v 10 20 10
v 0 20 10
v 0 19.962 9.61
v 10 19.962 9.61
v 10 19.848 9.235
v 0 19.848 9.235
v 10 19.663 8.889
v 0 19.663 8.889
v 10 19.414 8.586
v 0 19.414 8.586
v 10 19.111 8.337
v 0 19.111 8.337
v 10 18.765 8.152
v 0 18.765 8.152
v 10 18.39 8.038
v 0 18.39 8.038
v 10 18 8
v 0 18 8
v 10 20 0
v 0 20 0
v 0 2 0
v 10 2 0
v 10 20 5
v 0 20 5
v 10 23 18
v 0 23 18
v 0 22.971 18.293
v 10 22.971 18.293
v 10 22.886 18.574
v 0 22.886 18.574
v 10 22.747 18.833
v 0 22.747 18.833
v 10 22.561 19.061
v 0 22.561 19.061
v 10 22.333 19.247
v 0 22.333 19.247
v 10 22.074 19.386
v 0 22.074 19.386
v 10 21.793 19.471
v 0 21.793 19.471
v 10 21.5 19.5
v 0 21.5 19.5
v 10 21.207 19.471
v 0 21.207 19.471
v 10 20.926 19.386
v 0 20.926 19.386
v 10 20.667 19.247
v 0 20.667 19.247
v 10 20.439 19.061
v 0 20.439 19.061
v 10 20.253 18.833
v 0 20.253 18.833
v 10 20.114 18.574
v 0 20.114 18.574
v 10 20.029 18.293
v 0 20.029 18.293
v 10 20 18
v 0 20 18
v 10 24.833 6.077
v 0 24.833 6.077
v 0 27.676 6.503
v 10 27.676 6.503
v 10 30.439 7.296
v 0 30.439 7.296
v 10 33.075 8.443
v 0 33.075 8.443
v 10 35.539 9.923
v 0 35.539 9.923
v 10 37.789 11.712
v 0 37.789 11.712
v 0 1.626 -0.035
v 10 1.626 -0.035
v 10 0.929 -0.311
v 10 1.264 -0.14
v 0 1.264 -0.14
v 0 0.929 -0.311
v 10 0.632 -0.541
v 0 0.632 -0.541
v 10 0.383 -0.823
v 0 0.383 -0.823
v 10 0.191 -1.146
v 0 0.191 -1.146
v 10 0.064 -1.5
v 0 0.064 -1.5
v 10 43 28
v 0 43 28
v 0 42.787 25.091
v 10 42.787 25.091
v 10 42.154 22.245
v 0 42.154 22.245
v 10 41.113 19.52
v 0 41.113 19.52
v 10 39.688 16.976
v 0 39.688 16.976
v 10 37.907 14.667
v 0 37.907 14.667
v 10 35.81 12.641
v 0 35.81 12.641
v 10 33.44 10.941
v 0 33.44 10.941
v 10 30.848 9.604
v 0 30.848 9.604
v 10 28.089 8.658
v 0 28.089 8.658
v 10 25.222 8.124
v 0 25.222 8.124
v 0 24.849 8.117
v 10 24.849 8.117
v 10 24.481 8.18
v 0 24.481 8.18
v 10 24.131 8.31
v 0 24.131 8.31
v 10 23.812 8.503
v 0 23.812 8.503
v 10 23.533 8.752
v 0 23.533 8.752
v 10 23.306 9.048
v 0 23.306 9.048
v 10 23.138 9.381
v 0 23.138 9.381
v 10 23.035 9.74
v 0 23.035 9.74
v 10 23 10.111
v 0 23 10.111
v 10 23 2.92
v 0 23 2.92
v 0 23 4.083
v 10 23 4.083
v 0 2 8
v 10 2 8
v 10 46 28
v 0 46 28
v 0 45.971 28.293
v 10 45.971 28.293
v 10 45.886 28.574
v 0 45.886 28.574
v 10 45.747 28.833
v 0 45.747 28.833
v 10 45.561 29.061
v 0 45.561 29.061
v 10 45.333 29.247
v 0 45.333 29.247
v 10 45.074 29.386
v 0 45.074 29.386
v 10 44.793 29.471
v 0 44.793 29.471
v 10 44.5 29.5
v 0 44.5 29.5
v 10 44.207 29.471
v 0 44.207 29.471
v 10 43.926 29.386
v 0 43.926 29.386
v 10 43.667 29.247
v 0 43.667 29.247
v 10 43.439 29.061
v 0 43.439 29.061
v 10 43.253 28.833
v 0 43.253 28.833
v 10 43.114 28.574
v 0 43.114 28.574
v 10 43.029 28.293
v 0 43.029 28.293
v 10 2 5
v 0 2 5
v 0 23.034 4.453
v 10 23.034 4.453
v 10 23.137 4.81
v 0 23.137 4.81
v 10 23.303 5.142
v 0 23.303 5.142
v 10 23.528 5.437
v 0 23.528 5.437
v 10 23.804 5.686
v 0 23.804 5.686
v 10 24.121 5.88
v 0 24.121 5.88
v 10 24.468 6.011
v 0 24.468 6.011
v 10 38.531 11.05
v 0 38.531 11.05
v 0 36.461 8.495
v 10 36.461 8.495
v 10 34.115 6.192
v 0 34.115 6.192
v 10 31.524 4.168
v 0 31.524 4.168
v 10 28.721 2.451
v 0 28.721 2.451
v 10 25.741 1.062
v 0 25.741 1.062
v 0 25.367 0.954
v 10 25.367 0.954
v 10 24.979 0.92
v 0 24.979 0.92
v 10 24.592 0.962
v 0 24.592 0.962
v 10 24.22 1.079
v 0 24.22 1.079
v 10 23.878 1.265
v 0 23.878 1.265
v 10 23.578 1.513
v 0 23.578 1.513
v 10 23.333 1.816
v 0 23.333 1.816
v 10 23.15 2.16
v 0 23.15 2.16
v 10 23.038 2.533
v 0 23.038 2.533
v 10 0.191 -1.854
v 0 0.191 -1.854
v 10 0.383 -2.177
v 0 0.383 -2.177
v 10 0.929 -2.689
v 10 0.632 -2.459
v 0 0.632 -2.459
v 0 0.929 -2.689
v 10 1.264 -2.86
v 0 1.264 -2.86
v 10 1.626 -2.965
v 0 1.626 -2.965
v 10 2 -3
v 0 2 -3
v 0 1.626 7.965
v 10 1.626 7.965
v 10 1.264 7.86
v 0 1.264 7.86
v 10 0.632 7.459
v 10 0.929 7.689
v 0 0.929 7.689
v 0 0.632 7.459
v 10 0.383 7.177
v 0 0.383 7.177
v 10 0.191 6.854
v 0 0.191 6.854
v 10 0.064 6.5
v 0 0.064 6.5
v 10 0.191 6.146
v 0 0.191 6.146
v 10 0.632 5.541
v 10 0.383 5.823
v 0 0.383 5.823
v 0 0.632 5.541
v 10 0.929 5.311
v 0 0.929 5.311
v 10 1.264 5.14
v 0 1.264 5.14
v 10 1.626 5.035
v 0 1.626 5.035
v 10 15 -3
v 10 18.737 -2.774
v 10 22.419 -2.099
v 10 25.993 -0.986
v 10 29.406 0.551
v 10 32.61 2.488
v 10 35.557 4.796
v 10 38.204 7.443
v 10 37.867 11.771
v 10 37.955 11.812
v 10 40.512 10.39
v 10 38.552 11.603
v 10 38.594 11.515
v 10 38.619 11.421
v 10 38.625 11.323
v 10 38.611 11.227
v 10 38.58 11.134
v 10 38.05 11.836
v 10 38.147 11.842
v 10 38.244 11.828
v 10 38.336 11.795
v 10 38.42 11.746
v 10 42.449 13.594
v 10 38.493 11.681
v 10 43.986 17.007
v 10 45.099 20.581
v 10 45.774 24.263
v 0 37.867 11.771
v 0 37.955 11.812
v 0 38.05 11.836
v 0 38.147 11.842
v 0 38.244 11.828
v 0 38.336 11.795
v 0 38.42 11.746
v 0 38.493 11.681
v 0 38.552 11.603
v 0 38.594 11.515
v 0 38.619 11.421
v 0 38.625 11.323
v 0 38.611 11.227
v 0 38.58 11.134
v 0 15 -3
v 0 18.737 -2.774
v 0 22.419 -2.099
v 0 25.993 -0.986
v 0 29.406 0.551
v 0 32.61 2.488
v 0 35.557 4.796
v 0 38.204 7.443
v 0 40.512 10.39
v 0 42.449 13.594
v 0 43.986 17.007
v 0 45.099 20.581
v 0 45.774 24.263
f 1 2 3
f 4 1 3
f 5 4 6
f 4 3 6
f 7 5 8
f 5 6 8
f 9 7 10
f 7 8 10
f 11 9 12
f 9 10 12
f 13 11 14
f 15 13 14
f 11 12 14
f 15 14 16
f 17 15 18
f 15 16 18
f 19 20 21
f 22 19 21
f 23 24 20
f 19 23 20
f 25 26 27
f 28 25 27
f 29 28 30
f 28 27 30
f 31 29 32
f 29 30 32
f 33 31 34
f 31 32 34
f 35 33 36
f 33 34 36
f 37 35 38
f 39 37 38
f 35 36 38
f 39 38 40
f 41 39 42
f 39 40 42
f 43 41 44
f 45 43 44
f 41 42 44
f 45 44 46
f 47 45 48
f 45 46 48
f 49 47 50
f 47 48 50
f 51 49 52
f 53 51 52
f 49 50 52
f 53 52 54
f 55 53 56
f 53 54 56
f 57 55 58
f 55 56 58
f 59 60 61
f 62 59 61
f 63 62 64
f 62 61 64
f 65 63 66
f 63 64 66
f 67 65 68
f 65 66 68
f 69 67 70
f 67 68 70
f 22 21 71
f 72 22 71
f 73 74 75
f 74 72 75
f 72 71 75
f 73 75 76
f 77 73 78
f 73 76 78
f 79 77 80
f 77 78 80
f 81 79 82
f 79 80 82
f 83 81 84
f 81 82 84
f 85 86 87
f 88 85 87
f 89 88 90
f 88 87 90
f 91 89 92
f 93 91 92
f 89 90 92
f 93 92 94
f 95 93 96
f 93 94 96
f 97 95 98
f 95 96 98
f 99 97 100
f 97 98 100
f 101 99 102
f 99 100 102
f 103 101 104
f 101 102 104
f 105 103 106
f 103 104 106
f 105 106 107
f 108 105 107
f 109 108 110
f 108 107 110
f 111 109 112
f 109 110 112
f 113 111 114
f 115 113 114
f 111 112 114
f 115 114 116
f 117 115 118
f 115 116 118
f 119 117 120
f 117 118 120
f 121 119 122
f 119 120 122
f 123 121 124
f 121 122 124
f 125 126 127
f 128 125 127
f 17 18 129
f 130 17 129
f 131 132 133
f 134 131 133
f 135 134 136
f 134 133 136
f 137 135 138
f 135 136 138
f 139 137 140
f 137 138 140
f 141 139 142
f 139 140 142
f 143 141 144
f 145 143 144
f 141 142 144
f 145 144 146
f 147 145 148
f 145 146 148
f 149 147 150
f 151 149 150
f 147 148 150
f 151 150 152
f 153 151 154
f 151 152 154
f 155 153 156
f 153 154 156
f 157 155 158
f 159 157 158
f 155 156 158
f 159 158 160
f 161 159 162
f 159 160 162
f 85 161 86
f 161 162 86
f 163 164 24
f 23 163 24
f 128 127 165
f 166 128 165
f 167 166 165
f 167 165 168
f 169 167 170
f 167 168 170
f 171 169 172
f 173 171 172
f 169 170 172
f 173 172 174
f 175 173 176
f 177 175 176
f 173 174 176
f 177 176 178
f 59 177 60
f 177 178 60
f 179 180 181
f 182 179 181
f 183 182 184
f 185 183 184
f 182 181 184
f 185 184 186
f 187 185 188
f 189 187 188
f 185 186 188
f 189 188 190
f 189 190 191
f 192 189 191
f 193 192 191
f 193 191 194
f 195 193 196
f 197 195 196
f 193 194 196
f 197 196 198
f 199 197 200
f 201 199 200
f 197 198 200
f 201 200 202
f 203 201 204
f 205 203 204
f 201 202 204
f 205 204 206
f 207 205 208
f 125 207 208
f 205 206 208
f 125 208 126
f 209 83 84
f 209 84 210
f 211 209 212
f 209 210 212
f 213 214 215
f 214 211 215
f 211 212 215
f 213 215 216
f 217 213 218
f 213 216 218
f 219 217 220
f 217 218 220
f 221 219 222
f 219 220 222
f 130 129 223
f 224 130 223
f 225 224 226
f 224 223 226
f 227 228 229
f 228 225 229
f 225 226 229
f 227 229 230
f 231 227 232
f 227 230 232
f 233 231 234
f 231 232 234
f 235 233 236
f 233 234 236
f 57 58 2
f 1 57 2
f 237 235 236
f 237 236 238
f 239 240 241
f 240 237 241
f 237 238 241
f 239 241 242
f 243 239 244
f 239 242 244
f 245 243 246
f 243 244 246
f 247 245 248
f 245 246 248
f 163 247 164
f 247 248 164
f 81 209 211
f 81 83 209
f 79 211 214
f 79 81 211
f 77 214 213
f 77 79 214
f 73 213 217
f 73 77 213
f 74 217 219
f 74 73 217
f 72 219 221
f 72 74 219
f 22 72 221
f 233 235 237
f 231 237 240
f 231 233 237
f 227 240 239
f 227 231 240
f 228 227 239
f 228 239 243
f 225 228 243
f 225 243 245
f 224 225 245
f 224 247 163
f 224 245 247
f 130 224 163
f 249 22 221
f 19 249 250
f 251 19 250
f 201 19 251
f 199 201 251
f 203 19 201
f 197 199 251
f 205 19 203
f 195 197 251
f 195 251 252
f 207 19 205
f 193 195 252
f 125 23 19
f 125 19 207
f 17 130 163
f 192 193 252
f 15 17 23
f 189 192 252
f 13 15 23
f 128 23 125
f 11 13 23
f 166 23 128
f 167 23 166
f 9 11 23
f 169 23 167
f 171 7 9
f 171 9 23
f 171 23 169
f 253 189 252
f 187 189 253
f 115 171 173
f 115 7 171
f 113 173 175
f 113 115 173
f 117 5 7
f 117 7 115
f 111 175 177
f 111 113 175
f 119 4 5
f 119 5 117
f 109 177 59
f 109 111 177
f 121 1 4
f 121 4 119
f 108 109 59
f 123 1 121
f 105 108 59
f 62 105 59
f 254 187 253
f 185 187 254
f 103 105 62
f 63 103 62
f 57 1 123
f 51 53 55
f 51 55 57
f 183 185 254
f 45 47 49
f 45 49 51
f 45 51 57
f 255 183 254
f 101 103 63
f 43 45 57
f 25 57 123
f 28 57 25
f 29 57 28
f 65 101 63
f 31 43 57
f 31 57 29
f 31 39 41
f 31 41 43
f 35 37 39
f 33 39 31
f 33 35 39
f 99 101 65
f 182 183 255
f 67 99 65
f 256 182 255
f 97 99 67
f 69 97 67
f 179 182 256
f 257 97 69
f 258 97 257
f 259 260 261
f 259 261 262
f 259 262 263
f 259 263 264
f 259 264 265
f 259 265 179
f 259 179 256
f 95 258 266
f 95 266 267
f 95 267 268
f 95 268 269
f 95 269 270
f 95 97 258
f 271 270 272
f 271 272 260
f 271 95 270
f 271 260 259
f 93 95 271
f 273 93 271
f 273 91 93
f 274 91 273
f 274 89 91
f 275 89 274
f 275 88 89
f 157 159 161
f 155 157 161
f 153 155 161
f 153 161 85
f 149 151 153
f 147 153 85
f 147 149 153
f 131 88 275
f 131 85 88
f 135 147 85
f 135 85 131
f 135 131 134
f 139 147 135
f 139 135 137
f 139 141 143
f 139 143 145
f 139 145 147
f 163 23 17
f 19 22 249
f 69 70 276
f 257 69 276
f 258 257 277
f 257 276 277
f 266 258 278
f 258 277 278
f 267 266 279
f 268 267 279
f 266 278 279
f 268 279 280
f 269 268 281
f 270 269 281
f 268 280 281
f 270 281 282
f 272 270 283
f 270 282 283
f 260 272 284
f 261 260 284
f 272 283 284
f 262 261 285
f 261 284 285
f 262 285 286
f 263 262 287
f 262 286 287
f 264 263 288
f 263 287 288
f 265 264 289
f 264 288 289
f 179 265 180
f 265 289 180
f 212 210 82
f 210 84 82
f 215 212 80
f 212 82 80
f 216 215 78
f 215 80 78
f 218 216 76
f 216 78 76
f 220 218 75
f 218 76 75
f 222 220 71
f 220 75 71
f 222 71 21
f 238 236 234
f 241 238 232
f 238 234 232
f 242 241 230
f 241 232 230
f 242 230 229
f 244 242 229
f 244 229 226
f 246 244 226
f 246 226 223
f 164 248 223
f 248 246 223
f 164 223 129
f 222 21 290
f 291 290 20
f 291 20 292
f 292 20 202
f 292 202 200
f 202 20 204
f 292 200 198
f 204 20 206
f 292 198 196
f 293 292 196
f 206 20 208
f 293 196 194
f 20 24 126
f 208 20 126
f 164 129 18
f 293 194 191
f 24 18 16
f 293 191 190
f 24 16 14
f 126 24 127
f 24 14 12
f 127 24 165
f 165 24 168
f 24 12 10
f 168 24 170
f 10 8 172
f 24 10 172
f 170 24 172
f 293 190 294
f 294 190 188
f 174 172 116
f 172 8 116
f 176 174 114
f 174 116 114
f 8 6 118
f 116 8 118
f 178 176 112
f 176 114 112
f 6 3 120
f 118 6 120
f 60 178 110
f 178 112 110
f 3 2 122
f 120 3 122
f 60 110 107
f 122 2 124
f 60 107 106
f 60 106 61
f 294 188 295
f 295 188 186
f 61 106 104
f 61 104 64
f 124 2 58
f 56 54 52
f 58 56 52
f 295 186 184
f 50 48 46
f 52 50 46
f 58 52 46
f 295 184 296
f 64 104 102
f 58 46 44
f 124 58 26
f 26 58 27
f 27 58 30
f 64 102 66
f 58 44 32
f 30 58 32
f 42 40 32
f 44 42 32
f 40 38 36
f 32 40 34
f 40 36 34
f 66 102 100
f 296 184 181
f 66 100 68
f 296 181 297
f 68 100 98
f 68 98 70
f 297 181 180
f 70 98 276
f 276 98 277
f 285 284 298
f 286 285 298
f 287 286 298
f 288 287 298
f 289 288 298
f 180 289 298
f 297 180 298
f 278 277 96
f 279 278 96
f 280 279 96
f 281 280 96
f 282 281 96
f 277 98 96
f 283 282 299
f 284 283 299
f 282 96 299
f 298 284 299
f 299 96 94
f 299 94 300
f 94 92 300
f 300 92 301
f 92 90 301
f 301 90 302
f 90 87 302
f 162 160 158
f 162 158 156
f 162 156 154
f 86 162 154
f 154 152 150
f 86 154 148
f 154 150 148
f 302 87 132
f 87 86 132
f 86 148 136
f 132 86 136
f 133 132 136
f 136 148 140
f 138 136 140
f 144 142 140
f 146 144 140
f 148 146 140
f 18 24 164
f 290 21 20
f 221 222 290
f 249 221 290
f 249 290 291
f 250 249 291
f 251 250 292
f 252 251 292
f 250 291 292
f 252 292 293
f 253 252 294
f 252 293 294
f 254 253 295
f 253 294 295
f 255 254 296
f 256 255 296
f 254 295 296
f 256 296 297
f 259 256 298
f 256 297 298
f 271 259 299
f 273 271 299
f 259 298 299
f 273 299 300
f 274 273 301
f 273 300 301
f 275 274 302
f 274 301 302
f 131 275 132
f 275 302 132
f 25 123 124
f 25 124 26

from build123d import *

# Parameters (mm, degrees)
F1_DEPTH    = 10
F2_T1_DEPTH = 10
F2_T3_DEPTH = 20


# Not quite as in the source:
# - a fillet or chamfer that OpenCascade refuses, or shapes differently, is made with other operations: its cross-section is extruded or revolved along the edge and cut away or added
# - a feature names something its author has since deleted; it is built from what else it names


with BuildPart() as f1:
    # F0 (on Right) → F1 (new body)
    with BuildSketch(Plane.YZ):
        with BuildLine():
            Line((20, 0), (0, 0))
            Line((0, 0), (0, -3))
            Line((0, -3), (15, -3))
            ThreePointArc((15, -3), (36.9203102168, 6.0796897832), (46, 28))
            ThreePointArc((46, 28), (44.5, 29.5), (43, 28))
            ThreePointArc((43, 28), (37.1421356237, 13.8578643763), (23, 8))
            Line((23, 8), (23, 18))
            ThreePointArc((23, 18), (21.5, 19.5), (20, 18))
            Line((20, 18), (20, 8))
            Line((20, 8), (0, 8))
            Line((0, 8), (0, 5))
            Line((0, 5), (20, 5))
            Line((20, 5), (20, 0))
        make_face()
        with BuildLine():
            Line((23, 0.1252802705), (23, 6))
            ThreePointArc((23, 6), (30.9268806632, 7.4777057094), (37.7888888889, 11.712312459))
            ThreePointArc((37.7888888889, 11.712312459), (38.4580316617, 11.7150853421), (38.5307017544, 11.0498945447))
            ThreePointArc((38.5307017544, 11.0498945447), (31.6848160775, 4.2804529457), (23, 0.1252802705))
        make_face(mode=Mode.SUBTRACT)
    extrude(amount=F1_DEPTH)

    # F2: fillet of radius 2 on 8 edges, made by hand

    # F2_s2 → F2_t1 (join)
    with BuildSketch(Plane.YZ):
        with BuildLine():
            ThreePointArc((20, 10), (19.4142135624, 8.5857864376), (18, 8))
            Line((18, 8), (20, 8))
            Line((20, 8), (20, 10))
        make_face()
        with BuildLine():
            ThreePointArc((25.2222222222, 8.1238402), (23.6666666667, 8.620744195), (23, 10.11145618))
            Line((23, 10.11145618), (23, 8))
            ThreePointArc((23, 8), (24.1128351181, 8.0309840503), (25.2222222222, 8.1238402))
        make_face()
        with BuildLine():
            ThreePointArc((23, 4.0834785138), (23.5280398556, 5.4374849146), (24.8333333333, 6.076521971))
            ThreePointArc((24.8333333333, 6.076521971), (23.9174648117, 6.0191388176), (23, 6))
            Line((23, 6), (23, 4.0834785138))
        make_face()
        with BuildLine():
            ThreePointArc((25.7407407407, 1.0623592655), (23.8778327846, 1.2646093225), (23, 2.920127592))
            Line((23, 2.920127592), (23, 0.1252802705))
            ThreePointArc((23, 0.1252802705), (24.3820770695, 0.5595803629), (25.7407407407, 1.0623592655))
        make_face()
    extrude(amount=F2_T1_DEPTH)

    # F2_s4 → F2_t3 (cut)
    with BuildSketch(Plane.YZ.offset(-5)):
        with BuildLine():
            ThreePointArc((2, 8), (0.5857864376, 7.4142135624), (0, 6))
            Line((0, 6), (0, 8))
            Line((0, 8), (2, 8))
        make_face()
        with BuildLine():
            ThreePointArc((0, 7), (0.5857864376, 5.5857864376), (2, 5))
            Line((2, 5), (0, 5))
            Line((0, 5), (0, 7))
        make_face()
        with BuildLine():
            ThreePointArc((2, 0), (0.5857864376, -0.5857864376), (0, -2))
            Line((0, -2), (0, 0))
            Line((0, 0), (2, 0))
        make_face()
        with BuildLine():
            ThreePointArc((0, -1), (0.5857864376, -2.4142135624), (2, -3))
            Line((2, -3), (0, -3))
            Line((0, -3), (0, -1))
        make_face()
    extrude(amount=F2_T3_DEPTH, mode=Mode.SUBTRACT)


solid = f1.part
